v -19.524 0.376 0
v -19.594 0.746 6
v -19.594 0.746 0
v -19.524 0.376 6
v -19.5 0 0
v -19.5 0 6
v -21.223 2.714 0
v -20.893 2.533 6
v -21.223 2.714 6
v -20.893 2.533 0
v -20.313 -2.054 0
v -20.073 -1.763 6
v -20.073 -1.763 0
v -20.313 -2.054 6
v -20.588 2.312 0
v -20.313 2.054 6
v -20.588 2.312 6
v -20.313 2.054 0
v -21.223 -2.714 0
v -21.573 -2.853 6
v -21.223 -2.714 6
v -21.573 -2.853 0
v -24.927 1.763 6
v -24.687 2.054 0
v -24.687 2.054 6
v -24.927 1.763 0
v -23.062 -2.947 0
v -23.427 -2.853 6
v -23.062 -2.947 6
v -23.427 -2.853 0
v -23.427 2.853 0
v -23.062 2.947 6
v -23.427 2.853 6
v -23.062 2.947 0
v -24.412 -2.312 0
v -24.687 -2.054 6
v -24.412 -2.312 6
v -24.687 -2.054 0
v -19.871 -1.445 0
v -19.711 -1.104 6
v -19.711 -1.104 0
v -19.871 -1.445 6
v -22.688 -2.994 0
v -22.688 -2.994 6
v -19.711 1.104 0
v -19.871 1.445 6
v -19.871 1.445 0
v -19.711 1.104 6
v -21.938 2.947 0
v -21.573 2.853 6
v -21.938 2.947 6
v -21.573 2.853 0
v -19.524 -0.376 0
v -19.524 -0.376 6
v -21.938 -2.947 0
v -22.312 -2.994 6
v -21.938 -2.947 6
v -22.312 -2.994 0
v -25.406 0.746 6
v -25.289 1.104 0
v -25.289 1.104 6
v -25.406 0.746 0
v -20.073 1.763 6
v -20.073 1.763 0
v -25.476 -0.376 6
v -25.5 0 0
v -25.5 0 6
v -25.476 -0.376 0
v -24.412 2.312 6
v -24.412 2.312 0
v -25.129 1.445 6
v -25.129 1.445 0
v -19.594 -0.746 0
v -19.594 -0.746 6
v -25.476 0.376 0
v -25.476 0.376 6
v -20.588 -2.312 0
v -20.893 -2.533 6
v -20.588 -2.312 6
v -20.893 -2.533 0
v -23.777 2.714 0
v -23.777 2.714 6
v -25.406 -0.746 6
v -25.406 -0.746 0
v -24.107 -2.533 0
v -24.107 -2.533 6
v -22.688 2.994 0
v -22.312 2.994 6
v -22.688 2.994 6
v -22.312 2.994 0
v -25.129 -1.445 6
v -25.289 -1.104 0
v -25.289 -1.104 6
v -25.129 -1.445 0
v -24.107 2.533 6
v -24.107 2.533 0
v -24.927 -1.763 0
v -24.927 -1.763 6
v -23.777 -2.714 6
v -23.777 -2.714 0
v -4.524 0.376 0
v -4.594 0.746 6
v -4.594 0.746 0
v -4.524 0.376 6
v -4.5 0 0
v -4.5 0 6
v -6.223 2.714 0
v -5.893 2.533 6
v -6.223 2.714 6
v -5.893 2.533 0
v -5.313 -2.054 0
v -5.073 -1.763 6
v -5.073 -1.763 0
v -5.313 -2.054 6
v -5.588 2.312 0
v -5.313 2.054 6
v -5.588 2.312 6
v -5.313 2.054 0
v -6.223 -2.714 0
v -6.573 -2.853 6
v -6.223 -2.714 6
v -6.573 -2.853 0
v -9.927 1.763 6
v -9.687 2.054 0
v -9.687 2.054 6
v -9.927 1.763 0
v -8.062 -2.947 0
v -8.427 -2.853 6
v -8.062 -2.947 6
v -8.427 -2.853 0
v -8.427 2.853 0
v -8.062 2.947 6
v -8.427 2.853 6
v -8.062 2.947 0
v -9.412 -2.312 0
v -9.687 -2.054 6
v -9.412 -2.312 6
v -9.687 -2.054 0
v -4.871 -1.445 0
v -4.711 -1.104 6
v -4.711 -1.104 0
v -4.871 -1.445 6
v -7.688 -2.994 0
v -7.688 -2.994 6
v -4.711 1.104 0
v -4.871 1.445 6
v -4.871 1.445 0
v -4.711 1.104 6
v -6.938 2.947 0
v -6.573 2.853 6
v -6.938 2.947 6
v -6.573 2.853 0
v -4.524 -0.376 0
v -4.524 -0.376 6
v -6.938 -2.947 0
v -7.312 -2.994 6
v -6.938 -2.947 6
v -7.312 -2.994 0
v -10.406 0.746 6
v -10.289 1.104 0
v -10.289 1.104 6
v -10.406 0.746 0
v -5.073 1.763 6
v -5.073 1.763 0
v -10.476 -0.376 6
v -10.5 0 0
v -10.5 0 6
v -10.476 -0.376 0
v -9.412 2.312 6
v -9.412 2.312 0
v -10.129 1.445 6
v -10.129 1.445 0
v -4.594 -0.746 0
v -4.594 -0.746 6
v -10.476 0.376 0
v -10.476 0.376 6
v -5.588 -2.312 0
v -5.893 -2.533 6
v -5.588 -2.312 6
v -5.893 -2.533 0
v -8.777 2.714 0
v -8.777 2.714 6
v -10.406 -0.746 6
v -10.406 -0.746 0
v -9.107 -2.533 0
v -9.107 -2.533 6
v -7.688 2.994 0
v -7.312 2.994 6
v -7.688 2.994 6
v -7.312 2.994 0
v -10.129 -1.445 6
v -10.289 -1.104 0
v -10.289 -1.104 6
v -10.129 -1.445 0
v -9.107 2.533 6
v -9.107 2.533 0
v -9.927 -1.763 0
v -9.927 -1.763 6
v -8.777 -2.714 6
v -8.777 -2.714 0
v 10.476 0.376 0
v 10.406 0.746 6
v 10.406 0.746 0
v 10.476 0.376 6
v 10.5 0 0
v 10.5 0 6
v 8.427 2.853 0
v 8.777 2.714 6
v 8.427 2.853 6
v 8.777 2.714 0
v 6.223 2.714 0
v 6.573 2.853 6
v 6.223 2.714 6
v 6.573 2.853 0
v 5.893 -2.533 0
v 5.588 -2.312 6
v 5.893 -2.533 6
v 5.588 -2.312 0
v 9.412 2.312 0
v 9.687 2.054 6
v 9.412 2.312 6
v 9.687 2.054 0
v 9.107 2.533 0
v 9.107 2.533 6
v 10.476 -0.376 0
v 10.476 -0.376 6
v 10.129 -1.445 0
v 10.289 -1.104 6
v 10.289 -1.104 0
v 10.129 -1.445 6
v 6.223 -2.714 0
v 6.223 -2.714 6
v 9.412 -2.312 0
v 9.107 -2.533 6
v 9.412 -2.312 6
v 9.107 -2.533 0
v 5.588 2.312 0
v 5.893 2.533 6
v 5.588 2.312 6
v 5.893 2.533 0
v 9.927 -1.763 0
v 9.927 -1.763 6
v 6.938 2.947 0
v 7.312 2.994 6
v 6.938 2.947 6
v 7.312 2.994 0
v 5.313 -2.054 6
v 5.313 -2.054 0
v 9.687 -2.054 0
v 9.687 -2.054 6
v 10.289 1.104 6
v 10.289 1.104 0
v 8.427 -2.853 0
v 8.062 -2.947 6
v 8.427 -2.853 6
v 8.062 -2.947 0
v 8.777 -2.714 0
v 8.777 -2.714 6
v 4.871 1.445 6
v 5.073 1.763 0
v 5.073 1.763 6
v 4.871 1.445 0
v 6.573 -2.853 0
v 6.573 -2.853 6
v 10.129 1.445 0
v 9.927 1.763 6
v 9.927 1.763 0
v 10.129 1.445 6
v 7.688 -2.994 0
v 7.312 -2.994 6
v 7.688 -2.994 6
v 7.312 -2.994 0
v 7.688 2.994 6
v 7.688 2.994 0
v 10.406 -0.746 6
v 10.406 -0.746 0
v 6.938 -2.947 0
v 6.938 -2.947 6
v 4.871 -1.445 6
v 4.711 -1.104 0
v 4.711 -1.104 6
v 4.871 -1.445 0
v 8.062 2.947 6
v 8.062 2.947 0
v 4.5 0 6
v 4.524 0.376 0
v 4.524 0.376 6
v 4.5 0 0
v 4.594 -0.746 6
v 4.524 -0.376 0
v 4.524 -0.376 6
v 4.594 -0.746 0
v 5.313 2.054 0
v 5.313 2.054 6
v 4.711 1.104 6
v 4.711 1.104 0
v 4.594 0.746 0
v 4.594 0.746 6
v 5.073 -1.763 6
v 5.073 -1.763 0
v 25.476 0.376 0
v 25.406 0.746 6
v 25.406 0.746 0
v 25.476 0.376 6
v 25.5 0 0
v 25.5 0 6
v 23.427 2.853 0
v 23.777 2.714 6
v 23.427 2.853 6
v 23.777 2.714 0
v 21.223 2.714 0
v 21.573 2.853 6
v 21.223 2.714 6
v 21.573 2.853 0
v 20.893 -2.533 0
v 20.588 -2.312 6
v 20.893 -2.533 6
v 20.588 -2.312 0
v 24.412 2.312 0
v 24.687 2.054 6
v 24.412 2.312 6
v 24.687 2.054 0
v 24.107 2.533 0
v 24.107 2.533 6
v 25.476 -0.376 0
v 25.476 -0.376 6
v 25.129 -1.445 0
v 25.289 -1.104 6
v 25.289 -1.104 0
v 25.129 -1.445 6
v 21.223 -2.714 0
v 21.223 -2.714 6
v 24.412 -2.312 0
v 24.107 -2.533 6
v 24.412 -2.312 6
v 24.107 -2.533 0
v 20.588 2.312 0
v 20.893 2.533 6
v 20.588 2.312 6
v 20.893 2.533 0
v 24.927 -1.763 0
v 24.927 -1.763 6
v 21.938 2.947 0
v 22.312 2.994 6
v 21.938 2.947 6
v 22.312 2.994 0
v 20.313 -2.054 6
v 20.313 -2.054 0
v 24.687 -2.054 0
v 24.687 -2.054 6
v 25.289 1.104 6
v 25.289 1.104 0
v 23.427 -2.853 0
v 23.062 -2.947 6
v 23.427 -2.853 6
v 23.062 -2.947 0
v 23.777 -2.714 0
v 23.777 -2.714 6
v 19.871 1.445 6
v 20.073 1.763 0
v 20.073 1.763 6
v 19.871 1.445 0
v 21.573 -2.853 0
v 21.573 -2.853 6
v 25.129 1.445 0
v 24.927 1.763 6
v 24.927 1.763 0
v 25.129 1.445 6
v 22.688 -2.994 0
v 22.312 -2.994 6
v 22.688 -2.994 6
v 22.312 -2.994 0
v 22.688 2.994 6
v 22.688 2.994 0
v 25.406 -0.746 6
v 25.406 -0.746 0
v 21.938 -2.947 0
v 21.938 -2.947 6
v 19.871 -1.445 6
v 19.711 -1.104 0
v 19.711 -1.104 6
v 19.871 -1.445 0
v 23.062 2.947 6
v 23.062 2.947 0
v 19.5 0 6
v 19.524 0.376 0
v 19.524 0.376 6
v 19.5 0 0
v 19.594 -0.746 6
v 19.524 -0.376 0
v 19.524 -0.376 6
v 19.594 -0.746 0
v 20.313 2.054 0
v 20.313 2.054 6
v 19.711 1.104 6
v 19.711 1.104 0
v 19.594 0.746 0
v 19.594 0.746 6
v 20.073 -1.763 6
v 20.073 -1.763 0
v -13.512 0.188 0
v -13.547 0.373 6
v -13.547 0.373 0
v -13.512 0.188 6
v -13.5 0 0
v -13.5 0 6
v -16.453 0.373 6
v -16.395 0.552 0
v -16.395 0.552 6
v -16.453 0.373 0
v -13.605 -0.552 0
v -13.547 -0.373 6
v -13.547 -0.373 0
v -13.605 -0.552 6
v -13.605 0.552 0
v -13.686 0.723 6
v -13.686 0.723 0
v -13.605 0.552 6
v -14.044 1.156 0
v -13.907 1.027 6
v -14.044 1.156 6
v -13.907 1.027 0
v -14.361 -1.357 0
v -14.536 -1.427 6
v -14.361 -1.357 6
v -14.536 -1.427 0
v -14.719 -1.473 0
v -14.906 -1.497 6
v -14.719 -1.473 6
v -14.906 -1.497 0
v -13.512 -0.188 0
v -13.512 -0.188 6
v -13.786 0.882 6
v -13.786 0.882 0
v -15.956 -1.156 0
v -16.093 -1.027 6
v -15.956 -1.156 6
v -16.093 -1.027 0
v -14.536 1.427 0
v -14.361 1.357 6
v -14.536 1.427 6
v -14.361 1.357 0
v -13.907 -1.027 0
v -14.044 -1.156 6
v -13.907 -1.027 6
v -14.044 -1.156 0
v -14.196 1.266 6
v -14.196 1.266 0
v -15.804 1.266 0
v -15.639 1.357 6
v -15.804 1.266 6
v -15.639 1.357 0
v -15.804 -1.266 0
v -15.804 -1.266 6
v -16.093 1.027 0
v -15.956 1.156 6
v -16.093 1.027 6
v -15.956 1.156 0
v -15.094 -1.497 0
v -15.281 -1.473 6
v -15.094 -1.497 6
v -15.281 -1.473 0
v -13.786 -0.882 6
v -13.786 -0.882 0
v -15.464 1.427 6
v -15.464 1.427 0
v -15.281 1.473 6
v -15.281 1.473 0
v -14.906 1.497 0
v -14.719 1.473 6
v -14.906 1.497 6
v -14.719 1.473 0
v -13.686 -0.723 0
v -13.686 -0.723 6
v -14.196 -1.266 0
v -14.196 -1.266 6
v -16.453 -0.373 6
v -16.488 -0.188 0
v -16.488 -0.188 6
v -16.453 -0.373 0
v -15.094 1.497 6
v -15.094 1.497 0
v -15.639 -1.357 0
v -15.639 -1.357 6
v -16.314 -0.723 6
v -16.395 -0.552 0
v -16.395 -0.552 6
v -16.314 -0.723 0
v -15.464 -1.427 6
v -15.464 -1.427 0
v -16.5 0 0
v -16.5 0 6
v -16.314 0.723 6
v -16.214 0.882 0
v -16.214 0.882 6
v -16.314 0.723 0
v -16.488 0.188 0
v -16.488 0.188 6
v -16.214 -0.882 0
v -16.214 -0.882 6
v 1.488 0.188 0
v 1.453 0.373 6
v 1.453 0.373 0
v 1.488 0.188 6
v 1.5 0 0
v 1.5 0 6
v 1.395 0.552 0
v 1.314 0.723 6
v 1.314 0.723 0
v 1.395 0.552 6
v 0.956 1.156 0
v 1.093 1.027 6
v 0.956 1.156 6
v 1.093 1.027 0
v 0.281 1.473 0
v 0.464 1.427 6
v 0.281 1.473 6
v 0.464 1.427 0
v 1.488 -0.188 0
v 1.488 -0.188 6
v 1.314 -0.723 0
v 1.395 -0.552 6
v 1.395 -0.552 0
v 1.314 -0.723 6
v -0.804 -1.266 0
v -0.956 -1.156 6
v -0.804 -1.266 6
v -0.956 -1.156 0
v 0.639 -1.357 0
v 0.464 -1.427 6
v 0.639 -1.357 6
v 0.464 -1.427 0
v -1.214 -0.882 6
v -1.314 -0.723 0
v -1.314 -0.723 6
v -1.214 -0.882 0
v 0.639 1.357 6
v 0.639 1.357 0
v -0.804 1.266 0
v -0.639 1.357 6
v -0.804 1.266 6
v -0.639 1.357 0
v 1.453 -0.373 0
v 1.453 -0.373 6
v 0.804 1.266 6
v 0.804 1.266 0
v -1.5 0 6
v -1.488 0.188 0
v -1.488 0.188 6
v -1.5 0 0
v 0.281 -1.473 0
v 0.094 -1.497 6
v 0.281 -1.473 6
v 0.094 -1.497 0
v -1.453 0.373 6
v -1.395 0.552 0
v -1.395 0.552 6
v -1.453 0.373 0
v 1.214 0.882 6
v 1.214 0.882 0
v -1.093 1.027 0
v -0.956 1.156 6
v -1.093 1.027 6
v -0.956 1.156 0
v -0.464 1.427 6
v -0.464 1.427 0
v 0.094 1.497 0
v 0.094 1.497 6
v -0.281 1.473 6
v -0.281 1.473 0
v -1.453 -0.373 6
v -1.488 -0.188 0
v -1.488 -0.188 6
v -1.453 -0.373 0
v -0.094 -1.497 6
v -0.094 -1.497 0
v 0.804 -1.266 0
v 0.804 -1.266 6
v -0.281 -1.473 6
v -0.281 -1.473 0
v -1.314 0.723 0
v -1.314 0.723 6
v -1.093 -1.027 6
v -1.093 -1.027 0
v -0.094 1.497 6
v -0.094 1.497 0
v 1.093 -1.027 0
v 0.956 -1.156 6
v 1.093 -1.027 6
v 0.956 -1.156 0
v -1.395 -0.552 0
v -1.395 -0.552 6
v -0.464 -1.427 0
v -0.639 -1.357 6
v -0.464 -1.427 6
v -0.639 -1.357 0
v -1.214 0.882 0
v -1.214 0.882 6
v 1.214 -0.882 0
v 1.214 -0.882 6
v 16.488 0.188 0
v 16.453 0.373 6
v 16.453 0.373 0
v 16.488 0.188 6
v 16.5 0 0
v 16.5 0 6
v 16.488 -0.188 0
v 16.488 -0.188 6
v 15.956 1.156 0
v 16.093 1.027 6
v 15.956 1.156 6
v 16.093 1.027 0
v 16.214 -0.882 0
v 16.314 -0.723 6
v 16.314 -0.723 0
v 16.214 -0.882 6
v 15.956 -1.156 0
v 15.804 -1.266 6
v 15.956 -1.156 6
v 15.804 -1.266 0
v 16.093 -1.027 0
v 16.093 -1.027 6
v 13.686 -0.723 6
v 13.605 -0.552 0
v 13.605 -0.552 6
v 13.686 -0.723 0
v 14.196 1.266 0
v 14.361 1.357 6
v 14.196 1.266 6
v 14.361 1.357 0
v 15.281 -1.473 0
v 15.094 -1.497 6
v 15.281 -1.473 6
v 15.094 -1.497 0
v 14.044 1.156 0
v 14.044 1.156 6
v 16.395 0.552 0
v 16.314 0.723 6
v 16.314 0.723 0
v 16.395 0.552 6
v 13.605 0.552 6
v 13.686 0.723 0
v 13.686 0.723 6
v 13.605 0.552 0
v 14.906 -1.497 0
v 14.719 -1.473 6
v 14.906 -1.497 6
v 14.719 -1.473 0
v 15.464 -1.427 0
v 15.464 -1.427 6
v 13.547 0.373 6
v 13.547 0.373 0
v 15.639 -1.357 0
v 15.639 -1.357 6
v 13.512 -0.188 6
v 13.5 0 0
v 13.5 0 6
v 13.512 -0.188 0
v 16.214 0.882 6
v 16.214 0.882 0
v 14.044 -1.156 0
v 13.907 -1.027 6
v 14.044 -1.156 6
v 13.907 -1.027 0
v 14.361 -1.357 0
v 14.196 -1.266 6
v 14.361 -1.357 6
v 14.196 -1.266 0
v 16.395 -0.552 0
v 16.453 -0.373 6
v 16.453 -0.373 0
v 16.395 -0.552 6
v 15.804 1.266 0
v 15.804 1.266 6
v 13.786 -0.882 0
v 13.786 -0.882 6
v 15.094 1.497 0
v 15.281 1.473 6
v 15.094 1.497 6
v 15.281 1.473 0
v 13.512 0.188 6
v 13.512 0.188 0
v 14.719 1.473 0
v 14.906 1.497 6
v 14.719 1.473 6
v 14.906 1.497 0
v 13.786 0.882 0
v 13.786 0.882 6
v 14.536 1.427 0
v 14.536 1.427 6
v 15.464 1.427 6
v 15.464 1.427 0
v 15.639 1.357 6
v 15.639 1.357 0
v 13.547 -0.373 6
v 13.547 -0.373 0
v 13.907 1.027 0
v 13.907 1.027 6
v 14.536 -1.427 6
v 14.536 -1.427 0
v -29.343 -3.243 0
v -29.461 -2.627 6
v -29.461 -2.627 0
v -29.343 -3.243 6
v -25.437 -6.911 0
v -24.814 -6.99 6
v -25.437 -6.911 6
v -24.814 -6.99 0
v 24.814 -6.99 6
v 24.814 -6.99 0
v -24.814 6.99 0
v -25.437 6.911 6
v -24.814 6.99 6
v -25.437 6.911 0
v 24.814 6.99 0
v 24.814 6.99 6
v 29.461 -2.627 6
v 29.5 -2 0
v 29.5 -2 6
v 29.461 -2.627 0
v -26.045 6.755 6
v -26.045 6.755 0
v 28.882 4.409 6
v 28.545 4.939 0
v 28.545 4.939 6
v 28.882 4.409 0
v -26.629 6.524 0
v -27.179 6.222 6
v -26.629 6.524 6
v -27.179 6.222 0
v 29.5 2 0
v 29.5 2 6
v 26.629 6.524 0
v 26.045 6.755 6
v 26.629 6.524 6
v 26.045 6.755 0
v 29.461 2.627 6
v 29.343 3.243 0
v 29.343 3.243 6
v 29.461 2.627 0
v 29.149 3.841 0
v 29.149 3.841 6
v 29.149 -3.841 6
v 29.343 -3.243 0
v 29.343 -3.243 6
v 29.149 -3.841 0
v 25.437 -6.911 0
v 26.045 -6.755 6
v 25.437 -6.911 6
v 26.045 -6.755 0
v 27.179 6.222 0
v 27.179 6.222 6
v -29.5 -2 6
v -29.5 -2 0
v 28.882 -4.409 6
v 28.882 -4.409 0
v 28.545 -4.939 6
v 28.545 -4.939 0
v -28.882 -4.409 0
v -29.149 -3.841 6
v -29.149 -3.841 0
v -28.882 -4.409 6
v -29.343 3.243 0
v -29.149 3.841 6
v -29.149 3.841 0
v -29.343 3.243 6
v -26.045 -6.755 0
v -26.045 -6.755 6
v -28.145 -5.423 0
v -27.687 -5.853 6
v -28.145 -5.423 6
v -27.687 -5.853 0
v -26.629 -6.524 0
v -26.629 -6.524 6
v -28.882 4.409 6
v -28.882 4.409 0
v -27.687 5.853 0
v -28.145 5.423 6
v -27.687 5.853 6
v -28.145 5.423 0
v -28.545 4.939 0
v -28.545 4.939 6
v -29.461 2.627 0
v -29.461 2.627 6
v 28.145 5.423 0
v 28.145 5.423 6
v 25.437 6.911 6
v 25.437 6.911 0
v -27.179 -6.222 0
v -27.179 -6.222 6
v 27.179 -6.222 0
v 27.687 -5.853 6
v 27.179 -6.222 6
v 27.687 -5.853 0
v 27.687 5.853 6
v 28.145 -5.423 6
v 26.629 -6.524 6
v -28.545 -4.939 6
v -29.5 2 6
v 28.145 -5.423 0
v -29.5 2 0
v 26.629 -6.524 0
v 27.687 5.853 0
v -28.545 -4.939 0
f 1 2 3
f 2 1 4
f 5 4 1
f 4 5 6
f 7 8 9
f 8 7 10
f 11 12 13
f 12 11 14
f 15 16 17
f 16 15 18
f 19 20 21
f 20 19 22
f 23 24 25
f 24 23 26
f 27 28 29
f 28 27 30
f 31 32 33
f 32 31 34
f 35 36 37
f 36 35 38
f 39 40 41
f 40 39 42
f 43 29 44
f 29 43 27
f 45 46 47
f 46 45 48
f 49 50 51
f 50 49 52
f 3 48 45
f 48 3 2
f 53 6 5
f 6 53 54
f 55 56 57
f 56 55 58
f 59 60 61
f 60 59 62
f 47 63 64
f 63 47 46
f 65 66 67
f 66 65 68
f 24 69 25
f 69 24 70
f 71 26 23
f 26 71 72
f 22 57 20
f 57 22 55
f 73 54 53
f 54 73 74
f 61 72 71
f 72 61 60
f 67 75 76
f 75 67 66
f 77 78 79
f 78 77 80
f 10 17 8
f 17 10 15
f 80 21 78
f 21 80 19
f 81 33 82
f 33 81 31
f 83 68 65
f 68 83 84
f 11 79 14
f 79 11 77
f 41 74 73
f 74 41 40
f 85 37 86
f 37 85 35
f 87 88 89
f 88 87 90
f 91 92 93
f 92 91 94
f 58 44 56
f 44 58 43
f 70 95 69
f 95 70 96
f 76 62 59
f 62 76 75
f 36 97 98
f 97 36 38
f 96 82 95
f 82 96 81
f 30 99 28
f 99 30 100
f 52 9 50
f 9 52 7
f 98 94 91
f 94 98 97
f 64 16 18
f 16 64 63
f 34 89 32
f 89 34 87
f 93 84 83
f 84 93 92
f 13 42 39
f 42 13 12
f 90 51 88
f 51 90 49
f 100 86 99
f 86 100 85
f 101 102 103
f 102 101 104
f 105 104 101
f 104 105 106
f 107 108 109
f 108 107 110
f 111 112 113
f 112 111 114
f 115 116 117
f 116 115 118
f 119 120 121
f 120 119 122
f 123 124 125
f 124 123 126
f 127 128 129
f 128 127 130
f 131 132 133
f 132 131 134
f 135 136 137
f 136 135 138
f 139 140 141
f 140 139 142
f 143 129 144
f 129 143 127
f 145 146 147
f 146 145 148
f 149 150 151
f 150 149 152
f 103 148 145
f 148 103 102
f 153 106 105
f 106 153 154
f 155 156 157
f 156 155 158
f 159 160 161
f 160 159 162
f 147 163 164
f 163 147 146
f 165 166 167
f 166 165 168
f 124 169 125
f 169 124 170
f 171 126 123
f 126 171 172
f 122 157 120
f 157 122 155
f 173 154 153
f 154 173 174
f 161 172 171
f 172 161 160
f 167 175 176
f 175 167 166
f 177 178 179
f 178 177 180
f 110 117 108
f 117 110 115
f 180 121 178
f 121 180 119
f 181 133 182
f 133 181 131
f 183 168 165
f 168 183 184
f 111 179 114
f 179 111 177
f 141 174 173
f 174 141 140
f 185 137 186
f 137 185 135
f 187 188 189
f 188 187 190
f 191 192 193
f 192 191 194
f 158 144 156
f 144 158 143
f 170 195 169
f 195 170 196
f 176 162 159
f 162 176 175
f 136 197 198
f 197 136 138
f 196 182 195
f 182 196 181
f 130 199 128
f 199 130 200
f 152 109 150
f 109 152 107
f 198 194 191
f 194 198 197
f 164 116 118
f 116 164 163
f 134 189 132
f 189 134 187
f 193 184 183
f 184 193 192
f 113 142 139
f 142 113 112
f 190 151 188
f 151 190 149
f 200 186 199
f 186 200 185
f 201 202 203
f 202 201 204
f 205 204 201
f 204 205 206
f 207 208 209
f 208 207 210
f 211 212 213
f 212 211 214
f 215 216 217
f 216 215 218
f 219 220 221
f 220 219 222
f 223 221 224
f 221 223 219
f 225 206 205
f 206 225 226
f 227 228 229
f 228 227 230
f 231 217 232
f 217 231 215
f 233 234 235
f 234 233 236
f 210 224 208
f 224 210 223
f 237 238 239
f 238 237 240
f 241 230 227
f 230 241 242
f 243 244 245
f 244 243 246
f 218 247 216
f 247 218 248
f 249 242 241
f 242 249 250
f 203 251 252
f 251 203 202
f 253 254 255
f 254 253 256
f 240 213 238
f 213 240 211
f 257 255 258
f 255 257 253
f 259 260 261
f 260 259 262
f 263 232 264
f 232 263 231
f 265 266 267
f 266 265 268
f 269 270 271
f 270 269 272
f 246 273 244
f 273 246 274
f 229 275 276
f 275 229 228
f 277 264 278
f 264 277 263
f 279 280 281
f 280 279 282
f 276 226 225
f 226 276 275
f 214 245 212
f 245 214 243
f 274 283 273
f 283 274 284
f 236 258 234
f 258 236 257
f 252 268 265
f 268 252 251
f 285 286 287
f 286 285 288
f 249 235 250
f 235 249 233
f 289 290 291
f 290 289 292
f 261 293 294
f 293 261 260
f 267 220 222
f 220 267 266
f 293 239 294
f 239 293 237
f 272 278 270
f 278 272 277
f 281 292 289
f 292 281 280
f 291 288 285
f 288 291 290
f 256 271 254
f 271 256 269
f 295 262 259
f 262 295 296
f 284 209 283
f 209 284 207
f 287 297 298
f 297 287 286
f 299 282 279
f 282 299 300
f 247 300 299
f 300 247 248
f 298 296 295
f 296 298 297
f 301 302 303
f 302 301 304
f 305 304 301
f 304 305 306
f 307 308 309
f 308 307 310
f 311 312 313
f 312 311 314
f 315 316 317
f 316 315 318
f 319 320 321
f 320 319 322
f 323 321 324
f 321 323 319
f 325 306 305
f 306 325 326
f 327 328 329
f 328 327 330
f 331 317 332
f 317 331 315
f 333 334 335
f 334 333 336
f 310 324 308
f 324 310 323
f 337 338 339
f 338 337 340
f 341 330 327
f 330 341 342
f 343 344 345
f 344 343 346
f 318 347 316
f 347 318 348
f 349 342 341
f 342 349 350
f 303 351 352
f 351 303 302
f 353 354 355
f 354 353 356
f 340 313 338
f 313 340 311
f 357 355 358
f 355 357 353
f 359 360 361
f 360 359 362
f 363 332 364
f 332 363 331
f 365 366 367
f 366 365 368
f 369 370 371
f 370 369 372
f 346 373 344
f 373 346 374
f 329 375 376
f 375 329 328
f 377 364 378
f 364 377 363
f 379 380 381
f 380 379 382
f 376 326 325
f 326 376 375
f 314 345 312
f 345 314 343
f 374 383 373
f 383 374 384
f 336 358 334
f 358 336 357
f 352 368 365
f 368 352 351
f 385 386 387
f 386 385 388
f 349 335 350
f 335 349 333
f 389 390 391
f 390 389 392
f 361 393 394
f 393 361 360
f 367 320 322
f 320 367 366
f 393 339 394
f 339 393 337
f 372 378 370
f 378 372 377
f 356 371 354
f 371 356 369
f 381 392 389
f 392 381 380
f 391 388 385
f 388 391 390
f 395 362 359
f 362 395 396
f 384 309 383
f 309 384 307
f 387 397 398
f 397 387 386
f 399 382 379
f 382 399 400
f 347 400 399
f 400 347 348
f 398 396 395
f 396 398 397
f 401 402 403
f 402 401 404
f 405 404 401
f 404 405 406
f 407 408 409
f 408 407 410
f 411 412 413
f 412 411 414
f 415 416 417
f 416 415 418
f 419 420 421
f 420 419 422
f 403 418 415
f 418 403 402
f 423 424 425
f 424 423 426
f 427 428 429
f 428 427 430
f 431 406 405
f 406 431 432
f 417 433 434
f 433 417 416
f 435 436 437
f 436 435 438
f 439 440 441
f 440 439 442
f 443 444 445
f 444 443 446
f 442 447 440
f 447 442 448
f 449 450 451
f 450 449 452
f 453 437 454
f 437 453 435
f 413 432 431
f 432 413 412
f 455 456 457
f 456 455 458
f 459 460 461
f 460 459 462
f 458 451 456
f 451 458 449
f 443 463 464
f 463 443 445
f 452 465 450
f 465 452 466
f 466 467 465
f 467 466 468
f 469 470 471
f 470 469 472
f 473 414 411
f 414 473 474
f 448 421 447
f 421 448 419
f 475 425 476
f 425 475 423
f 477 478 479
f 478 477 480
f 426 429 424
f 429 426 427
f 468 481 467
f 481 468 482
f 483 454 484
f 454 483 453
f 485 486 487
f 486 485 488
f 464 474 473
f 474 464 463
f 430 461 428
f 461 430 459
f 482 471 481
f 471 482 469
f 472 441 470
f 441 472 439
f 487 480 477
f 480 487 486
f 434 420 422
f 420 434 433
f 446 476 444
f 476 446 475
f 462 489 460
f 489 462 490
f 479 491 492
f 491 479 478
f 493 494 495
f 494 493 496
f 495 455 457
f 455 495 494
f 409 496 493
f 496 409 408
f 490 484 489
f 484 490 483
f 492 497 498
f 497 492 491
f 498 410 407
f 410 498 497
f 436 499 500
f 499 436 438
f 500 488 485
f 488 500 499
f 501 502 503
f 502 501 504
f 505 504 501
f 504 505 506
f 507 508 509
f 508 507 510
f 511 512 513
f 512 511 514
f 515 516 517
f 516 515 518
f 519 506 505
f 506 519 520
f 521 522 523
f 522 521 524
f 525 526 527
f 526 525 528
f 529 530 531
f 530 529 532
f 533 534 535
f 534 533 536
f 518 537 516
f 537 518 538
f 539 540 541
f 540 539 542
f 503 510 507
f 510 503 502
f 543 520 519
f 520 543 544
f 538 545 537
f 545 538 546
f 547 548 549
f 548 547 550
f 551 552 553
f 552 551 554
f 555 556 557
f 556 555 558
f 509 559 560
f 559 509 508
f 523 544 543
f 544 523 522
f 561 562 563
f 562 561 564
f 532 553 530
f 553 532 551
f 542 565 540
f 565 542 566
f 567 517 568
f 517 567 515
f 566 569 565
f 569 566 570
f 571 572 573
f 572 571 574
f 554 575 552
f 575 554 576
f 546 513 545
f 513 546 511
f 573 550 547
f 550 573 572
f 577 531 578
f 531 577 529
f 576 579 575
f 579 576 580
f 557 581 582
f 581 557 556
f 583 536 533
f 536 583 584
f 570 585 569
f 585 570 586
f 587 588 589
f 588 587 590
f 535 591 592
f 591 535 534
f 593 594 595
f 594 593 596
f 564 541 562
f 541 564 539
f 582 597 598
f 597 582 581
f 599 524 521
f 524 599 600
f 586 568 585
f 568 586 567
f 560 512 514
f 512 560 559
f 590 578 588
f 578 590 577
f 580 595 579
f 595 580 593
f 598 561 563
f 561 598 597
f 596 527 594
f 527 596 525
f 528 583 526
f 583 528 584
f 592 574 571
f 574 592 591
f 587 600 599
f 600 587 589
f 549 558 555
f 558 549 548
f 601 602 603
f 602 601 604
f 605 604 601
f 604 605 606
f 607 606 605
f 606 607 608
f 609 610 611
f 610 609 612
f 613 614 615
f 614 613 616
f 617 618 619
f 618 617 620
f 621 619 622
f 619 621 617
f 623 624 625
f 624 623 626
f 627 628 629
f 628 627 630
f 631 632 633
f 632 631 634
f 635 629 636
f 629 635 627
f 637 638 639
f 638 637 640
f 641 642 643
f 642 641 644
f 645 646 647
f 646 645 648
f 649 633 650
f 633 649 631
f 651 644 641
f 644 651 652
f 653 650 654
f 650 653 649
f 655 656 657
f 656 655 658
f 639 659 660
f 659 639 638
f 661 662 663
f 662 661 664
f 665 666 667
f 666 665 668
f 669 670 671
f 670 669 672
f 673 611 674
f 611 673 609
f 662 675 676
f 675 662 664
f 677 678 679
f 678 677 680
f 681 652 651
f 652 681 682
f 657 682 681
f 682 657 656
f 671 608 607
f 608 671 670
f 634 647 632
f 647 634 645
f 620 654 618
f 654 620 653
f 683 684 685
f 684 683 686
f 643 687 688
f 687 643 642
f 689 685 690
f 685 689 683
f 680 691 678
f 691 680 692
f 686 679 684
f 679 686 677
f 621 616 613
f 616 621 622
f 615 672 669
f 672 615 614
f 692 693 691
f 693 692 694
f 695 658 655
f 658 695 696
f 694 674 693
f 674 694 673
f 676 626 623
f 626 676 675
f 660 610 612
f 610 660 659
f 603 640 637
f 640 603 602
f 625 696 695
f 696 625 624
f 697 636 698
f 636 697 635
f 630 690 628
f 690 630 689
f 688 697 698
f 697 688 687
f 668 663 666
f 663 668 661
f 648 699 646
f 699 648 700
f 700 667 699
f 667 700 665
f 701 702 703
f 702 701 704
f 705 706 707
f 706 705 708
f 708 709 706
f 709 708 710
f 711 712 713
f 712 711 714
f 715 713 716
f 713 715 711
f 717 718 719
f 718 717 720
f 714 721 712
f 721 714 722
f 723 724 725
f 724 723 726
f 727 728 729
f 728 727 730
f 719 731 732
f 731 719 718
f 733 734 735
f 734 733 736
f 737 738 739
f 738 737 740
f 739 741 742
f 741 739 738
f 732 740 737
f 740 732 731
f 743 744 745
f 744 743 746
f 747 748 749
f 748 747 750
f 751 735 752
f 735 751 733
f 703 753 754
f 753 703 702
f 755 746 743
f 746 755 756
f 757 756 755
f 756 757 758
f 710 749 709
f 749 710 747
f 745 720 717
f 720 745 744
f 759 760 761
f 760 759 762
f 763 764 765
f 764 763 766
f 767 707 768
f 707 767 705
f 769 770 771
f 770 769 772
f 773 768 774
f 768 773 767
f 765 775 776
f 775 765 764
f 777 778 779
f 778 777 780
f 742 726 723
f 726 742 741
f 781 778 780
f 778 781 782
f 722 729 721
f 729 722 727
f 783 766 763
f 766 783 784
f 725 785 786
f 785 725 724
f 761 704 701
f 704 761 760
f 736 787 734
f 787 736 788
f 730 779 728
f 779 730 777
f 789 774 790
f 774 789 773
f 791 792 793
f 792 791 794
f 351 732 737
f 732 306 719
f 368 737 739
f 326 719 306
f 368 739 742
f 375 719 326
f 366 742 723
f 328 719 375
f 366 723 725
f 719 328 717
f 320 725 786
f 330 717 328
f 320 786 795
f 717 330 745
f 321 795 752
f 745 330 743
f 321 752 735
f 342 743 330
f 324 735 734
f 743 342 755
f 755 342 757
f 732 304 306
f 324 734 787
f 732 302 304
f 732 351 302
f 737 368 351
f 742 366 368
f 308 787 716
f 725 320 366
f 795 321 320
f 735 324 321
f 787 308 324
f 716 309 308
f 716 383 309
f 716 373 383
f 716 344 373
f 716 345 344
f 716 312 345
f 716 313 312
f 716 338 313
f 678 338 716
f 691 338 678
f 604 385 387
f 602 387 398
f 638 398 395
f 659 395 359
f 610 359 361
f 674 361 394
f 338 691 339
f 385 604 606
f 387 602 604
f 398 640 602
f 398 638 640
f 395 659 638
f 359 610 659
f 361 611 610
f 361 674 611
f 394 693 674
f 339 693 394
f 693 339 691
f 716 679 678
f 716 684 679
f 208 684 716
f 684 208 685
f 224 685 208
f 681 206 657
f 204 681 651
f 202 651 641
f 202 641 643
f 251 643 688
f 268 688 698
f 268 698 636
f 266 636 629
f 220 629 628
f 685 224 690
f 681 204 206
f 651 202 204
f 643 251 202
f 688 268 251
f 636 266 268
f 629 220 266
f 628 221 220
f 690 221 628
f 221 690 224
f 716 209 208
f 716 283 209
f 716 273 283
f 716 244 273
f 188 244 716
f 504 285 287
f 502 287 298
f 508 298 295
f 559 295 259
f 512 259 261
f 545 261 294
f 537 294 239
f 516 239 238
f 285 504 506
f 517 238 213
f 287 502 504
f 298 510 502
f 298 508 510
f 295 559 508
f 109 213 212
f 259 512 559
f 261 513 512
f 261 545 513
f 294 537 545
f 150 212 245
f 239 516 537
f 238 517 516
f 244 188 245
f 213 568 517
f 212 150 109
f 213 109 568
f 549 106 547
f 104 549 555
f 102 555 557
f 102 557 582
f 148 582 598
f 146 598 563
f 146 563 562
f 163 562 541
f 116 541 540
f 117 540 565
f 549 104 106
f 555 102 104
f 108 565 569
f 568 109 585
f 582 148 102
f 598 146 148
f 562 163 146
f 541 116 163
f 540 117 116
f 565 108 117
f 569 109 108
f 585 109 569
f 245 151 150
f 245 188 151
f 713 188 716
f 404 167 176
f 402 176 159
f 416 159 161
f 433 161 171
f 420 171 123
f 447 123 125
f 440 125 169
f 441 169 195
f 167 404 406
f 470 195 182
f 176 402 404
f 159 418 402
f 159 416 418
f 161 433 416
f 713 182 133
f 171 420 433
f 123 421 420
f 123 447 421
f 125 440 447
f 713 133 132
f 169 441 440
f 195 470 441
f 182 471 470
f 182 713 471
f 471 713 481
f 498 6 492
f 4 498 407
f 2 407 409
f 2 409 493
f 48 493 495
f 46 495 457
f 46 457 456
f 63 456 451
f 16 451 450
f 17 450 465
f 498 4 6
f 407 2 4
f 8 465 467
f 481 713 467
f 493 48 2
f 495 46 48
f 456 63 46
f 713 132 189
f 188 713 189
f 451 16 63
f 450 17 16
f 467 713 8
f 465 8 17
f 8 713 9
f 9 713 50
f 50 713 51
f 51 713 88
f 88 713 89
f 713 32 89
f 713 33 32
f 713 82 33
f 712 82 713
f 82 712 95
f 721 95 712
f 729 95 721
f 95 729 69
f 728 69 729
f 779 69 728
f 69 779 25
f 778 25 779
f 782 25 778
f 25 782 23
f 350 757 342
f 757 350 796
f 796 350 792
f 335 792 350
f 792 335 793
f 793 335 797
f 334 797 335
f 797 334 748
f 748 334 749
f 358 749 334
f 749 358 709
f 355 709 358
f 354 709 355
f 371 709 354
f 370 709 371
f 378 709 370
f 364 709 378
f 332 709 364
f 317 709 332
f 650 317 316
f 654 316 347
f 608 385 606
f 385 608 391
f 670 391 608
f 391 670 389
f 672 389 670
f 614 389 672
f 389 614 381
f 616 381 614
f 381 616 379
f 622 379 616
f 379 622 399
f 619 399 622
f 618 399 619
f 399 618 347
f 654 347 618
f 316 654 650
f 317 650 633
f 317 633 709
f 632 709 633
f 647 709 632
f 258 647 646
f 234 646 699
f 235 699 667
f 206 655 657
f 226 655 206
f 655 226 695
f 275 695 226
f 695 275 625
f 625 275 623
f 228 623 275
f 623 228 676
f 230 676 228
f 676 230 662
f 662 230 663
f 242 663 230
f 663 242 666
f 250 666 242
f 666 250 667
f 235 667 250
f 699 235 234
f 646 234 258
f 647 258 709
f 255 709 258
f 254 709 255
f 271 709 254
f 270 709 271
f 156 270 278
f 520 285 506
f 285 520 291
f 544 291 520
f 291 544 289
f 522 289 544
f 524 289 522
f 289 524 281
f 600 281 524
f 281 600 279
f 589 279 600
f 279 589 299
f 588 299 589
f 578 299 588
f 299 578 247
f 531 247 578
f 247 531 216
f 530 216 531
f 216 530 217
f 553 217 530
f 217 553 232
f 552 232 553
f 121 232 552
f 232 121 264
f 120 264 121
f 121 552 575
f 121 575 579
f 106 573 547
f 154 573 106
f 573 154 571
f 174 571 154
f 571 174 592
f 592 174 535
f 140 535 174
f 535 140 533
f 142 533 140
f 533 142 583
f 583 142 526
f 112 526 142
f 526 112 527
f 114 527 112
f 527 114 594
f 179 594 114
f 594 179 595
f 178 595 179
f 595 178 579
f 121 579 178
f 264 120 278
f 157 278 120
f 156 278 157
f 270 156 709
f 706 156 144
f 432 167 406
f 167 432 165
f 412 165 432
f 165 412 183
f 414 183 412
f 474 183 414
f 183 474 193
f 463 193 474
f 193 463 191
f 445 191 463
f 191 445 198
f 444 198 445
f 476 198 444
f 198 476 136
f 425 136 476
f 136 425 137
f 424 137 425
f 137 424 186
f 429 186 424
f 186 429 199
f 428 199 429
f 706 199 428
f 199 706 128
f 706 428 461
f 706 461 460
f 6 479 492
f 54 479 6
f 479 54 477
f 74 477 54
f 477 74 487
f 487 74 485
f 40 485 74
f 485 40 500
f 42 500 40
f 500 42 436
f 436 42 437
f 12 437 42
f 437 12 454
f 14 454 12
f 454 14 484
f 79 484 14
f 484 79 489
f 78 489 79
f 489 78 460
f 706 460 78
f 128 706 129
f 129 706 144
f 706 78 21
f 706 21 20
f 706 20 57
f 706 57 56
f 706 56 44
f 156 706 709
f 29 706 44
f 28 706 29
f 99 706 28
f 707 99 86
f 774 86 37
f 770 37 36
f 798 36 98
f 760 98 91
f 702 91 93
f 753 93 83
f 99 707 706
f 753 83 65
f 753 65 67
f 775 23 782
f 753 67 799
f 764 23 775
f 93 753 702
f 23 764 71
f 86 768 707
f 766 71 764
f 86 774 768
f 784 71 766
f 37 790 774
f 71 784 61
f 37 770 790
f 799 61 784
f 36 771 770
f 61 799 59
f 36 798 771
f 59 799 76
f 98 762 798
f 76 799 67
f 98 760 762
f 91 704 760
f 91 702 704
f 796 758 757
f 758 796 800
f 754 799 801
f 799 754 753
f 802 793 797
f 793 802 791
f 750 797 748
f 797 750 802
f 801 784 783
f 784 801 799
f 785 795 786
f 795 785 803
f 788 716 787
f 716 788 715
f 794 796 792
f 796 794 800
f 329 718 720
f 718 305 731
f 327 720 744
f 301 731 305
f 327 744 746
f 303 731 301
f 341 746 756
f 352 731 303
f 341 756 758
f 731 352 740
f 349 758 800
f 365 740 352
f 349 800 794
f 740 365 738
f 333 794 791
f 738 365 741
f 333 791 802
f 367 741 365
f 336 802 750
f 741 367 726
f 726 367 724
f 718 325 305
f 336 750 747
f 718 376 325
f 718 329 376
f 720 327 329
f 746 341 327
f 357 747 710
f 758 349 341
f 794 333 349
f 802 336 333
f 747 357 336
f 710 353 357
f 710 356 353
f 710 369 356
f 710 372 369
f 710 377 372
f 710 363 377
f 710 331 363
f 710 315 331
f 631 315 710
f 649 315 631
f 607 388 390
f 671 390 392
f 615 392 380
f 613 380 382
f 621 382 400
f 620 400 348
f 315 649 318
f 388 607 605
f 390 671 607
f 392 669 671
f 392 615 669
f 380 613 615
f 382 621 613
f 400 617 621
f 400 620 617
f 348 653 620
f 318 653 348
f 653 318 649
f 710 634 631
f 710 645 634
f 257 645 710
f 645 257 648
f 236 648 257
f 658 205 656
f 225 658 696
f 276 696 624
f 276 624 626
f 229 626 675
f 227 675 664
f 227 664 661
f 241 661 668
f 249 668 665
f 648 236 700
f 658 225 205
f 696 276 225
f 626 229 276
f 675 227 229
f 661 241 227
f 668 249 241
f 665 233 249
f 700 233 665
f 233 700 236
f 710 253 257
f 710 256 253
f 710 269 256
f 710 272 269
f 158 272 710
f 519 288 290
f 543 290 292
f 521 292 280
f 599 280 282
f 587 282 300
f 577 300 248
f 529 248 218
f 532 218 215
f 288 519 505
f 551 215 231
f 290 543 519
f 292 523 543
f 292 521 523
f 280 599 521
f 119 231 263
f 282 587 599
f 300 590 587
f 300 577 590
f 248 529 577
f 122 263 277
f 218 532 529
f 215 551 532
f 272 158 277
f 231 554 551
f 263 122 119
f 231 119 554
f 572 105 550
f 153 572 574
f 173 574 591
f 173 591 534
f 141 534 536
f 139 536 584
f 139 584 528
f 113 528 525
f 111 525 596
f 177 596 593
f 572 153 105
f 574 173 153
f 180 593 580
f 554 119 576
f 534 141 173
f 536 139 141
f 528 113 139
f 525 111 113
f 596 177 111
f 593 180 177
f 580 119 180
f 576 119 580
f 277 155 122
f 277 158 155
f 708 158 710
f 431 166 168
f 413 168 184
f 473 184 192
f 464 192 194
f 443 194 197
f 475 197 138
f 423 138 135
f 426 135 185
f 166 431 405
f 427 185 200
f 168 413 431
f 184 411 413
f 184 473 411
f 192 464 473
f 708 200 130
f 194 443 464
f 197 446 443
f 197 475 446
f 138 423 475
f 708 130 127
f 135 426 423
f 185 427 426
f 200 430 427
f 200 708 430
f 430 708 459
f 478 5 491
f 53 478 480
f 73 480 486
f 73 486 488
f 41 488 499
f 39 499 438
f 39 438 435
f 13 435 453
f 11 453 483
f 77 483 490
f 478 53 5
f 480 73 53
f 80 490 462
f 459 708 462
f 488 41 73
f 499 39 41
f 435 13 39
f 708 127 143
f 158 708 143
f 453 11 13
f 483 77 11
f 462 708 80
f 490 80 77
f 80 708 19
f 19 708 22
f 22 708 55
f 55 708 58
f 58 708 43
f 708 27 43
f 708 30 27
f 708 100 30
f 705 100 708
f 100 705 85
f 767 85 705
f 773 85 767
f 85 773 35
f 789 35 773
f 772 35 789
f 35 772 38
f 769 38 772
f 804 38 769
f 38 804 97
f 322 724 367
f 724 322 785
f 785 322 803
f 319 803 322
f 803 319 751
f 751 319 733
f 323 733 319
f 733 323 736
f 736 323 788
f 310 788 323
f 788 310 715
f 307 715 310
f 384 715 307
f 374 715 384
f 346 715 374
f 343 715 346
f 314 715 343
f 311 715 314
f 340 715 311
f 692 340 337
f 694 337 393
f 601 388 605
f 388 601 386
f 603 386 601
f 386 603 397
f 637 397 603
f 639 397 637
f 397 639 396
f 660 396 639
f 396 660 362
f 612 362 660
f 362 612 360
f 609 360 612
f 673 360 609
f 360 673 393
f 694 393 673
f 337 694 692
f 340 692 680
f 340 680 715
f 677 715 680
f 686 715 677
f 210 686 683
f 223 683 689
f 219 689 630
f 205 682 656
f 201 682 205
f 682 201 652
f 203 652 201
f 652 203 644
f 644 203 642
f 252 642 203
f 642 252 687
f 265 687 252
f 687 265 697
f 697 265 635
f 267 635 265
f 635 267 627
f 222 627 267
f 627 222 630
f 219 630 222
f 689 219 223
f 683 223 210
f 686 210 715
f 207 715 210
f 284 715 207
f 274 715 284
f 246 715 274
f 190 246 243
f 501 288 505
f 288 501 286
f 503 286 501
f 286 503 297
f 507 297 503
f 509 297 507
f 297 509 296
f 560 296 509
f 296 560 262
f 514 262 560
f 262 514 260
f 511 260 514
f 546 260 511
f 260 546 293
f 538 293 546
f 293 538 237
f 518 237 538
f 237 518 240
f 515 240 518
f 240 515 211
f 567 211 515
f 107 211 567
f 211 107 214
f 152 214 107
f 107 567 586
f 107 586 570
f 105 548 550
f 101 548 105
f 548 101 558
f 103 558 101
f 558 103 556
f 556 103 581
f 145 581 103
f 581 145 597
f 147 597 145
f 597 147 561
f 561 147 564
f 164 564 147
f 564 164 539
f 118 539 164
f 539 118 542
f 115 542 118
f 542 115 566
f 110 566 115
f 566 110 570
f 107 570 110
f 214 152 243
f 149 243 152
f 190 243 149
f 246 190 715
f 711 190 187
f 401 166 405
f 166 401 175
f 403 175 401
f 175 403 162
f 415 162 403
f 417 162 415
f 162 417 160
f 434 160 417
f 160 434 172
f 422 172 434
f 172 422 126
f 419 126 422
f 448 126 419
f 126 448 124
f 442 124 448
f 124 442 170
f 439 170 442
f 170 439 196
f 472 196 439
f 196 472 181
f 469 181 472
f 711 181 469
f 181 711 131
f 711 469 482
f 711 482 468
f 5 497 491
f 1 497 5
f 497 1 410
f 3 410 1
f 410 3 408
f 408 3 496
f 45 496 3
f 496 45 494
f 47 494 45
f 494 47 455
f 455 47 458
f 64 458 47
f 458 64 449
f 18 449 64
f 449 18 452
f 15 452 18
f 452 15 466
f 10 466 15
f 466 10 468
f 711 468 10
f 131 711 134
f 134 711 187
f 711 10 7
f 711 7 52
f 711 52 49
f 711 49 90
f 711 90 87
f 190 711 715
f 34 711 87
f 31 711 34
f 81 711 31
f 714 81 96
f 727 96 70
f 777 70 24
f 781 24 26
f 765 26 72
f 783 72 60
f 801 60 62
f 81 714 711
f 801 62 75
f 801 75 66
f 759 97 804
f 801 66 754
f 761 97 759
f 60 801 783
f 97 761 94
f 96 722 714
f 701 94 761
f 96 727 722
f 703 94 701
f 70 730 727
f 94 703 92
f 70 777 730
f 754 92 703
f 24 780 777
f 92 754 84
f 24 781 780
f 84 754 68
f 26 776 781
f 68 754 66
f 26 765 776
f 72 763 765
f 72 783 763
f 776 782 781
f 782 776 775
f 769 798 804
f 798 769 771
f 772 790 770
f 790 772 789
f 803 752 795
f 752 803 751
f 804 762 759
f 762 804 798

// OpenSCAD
$fn = 50;


difference() {
	union() {
		*color(alpha = 1.0000000000, c = "gray") {
			translate(v = [0, 7, 0]) {
				linear_extrude(height = 1) {
					text(font = "Arial:style=Bold", halign = "center", size = 4.5000000000, text = "COMMENT plate main", valign = "center");
				}
			}
		}
		hull() {
			translate(v = [-24.5000000000, 2.0000000000, 0]) {
				cylinder(h = 6, r = 5);
			}
			translate(v = [24.5000000000, 2.0000000000, 0]) {
				cylinder(h = 6, r = 5);
			}
			translate(v = [-24.5000000000, -2.0000000000, 0]) {
				cylinder(h = 6, r = 5);
			}
			translate(v = [24.5000000000, -2.0000000000, 0]) {
				cylinder(h = 6, r = 5);
			}
		}
	}
	union() {
		*color(alpha = 1.0000000000, c = "gray") {
			translate(v = [0, 7, 0]) {
				linear_extrude(height = 1) {
					text(font = "Arial:style=Bold", halign = "center", size = 4.5000000000, text = "COMMENT holes main", valign = "center");
				}
			}
		}
		translate(v = [-22.5000000000, 0.0000000000, 0]) {
			translate(v = [0, 0, -100]) {
				cylinder(h = 200, r = 3.0000000000);
			}
		}
		translate(v = [-7.5000000000, 0.0000000000, 0]) {
			translate(v = [0, 0, -100]) {
				cylinder(h = 200, r = 3.0000000000);
			}
		}
		translate(v = [7.5000000000, 0.0000000000, 0]) {
			translate(v = [0, 0, -100]) {
				cylinder(h = 200, r = 3.0000000000);
			}
		}
		translate(v = [22.5000000000, 0.0000000000, 0]) {
			translate(v = [0, 0, -100]) {
				cylinder(h = 200, r = 3.0000000000);
			}
		}
		translate(v = [-22.5000000000, 0.0000000000, 0]) {
			translate(v = [0, 0, -100]) {
				cylinder(h = 200, r = 1.5000000000);
			}
		}
		translate(v = [-15.0000000000, 0.0000000000, 0]) {
			translate(v = [0, 0, -100]) {
				cylinder(h = 200, r = 1.5000000000);
			}
		}
		translate(v = [-7.5000000000, 0.0000000000, 0]) {
			translate(v = [0, 0, -100]) {
				cylinder(h = 200, r = 1.5000000000);
			}
		}
		translate(v = [0, 0, -100]) {
			cylinder(h = 200, r = 1.5000000000);
		}
		translate(v = [7.5000000000, 0.0000000000, 0]) {
			translate(v = [0, 0, -100]) {
				cylinder(h = 200, r = 1.5000000000);
			}
		}
		translate(v = [15.0000000000, 0.0000000000, 0]) {
			translate(v = [0, 0, -100]) {
				cylinder(h = 200, r = 1.5000000000);
			}
		}
		translate(v = [22.5000000000, 0.0000000000, 0]) {
			translate(v = [0, 0, -100]) {
				cylinder(h = 200, r = 1.5000000000);
			}
		}
	}
}
